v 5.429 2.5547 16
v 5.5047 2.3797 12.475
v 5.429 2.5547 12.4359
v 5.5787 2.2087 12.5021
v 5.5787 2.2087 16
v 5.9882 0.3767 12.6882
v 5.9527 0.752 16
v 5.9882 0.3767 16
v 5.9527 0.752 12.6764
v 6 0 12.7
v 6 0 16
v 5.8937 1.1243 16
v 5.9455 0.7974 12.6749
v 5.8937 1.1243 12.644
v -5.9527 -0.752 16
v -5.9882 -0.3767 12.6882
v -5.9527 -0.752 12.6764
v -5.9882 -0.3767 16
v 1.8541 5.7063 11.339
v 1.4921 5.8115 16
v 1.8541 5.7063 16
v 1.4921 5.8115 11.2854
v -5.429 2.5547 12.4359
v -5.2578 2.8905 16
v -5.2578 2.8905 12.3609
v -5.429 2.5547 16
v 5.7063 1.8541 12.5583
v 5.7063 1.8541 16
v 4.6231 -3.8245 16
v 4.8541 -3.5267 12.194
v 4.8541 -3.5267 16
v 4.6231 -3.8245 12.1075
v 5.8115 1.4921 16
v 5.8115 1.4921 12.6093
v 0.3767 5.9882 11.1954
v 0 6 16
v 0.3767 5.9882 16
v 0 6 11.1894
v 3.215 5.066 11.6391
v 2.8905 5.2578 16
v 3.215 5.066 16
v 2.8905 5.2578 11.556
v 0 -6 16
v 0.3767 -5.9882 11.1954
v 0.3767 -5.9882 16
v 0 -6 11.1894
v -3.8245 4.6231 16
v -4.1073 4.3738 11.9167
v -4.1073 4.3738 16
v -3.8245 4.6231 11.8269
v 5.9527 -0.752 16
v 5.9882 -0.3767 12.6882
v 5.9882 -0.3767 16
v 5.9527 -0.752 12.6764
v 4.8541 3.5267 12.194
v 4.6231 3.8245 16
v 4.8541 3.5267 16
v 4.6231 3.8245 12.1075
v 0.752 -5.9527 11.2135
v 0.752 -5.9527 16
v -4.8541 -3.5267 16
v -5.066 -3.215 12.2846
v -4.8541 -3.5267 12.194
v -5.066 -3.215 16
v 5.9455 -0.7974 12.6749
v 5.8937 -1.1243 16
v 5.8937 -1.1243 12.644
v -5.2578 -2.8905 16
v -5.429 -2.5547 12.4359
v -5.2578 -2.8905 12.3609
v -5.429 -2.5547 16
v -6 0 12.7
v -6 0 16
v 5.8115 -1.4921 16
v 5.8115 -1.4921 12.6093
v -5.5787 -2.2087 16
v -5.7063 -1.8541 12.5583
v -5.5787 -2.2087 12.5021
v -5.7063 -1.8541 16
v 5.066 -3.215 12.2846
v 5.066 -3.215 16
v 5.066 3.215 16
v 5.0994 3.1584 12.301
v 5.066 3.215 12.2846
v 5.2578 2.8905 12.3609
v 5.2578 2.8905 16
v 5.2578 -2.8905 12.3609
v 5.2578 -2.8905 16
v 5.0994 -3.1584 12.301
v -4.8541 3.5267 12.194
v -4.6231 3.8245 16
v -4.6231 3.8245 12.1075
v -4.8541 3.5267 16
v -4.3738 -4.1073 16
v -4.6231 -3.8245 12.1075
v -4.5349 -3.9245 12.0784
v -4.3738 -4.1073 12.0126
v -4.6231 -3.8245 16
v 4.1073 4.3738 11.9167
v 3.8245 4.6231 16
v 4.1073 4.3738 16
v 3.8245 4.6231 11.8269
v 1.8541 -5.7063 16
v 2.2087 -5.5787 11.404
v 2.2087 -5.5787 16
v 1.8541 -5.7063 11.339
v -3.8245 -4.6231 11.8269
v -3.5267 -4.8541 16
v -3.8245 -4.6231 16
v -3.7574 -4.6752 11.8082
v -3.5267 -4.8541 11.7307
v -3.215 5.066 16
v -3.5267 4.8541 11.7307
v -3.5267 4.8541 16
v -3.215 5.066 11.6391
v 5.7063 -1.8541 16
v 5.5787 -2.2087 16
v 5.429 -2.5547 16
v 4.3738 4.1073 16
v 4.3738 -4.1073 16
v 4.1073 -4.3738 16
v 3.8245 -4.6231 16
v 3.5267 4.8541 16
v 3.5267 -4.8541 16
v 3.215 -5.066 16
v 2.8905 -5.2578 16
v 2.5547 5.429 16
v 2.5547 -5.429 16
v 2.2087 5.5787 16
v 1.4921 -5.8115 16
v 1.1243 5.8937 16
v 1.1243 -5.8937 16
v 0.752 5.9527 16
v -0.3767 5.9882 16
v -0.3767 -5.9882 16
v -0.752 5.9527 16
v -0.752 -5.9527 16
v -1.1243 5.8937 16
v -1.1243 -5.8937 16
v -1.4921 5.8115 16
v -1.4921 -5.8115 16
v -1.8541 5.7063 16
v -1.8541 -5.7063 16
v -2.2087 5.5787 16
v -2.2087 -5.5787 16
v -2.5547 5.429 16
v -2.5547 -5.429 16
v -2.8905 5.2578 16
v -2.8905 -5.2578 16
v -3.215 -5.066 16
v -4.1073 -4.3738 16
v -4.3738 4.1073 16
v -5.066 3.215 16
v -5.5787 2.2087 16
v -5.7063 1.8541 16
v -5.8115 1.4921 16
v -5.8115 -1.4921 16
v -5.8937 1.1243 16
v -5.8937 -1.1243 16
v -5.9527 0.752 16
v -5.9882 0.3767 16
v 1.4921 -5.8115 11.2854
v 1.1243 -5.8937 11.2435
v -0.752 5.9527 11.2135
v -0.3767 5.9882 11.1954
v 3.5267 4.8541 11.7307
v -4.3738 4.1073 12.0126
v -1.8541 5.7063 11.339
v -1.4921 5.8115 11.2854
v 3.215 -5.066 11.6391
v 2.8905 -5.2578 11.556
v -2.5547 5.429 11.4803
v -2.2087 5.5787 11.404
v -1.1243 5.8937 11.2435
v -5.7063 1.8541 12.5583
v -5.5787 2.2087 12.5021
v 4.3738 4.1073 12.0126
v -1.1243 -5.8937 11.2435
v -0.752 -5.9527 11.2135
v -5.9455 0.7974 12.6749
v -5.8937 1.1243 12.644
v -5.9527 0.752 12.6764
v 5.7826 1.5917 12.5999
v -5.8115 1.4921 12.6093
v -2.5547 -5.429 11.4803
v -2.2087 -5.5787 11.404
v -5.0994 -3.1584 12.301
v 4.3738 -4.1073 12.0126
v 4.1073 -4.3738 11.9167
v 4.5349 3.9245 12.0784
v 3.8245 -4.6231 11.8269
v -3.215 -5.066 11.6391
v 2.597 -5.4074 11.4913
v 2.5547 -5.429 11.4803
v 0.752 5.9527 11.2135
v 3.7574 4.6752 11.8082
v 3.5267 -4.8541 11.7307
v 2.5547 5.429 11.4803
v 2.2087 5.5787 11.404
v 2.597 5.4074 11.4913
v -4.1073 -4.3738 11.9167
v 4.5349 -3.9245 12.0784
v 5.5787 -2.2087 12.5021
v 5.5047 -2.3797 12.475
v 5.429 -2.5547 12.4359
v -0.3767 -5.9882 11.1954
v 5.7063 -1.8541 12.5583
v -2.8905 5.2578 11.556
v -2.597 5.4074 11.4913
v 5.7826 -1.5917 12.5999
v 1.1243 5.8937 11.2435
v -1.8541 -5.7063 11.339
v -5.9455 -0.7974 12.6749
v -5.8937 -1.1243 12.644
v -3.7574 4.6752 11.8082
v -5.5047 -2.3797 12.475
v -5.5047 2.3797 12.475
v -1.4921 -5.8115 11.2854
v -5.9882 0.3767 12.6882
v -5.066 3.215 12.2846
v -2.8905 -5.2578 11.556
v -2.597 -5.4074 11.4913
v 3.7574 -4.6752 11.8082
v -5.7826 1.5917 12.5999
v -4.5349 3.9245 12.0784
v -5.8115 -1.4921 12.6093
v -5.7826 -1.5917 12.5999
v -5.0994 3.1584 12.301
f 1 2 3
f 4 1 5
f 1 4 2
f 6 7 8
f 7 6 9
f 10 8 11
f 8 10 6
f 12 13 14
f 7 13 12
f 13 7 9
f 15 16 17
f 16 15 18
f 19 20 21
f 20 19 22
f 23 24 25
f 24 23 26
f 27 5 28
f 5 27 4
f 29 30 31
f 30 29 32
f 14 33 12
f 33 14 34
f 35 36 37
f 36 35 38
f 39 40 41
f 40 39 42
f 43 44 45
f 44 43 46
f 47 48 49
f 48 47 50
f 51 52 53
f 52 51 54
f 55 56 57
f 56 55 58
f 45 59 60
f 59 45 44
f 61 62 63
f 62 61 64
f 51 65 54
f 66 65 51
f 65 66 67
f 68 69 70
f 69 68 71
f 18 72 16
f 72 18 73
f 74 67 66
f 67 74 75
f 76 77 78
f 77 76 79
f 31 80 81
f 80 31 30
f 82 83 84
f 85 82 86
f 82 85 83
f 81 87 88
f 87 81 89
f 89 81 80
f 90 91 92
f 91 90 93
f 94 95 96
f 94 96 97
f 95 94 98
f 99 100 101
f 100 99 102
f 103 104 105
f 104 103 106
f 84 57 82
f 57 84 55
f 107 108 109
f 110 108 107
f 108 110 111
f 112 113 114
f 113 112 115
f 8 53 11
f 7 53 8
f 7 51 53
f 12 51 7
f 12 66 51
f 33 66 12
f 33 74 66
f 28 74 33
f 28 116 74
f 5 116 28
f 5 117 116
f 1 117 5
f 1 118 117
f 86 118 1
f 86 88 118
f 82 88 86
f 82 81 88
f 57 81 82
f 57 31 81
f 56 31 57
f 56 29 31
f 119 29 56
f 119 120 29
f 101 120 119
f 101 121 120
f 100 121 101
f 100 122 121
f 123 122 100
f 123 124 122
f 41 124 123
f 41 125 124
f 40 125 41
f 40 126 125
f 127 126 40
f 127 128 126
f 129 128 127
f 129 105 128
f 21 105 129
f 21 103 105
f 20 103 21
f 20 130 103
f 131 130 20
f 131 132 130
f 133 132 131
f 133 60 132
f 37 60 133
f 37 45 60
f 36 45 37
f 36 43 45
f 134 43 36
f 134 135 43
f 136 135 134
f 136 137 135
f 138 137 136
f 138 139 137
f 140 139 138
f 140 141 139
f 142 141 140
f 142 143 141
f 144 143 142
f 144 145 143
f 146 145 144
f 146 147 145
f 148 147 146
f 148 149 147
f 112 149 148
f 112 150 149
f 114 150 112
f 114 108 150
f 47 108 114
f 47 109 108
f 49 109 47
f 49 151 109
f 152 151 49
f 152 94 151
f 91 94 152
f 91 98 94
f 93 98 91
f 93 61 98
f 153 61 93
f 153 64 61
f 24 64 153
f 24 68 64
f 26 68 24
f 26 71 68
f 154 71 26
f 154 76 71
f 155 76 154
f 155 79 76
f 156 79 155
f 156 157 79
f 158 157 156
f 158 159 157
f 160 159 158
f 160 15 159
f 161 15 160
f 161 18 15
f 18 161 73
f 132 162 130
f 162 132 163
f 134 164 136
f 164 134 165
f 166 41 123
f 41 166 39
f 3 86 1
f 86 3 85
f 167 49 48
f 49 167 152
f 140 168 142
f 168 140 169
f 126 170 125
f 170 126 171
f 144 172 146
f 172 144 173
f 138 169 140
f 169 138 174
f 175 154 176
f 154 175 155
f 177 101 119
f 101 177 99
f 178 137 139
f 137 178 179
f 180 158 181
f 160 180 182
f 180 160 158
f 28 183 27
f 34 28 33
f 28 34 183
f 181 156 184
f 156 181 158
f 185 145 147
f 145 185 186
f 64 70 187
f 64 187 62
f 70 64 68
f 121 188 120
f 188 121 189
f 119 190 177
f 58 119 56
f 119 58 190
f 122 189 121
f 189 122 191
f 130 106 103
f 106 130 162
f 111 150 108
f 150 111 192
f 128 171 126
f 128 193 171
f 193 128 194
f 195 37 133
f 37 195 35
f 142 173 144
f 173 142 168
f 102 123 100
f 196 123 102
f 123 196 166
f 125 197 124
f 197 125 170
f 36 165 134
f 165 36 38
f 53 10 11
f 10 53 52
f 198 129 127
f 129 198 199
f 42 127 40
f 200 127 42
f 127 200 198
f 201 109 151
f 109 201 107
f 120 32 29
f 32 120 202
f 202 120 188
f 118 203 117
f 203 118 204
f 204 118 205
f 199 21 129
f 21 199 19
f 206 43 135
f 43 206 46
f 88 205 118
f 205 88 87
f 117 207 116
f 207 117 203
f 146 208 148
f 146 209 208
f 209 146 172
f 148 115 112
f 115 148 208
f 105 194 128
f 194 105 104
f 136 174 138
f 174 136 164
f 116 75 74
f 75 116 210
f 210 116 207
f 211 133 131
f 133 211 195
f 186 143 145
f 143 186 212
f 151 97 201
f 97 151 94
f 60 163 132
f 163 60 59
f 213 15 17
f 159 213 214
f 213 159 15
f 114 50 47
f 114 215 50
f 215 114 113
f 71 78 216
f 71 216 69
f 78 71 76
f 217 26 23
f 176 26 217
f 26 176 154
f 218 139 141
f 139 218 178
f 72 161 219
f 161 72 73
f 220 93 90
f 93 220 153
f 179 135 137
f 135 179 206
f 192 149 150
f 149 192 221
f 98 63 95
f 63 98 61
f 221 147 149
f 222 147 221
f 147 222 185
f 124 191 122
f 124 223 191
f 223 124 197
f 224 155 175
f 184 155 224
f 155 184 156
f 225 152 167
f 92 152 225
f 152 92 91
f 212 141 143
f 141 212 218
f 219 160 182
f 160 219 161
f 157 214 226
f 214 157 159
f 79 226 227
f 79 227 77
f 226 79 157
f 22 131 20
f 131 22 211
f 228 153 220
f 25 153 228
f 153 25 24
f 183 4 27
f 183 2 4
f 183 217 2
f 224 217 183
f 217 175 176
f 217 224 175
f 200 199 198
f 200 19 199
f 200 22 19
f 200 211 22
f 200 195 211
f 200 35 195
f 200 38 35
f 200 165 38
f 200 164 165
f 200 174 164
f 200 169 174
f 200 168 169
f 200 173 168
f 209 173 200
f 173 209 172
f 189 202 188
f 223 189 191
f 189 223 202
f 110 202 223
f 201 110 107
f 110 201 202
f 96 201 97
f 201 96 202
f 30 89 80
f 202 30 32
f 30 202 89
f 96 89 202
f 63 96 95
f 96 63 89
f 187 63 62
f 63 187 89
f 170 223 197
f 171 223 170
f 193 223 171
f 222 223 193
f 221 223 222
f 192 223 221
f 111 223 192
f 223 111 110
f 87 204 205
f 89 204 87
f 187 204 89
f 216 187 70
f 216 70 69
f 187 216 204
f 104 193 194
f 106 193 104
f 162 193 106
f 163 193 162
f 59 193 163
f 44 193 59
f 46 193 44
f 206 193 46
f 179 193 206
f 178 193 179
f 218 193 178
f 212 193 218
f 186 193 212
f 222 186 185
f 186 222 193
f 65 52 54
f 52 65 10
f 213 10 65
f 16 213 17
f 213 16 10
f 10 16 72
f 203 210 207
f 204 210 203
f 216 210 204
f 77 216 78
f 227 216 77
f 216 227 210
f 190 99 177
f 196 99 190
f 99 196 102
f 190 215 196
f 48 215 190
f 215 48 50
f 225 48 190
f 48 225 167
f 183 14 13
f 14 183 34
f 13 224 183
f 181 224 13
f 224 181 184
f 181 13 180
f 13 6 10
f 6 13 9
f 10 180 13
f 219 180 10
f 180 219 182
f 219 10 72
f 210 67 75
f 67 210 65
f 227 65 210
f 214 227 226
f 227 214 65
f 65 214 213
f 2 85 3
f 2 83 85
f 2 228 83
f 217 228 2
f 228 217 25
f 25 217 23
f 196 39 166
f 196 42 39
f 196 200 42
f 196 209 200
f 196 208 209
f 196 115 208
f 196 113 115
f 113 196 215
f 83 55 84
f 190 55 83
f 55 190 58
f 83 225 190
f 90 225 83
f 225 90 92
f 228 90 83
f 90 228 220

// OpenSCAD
// file: roundCornersCube.scad
/*
http://codeviewer.org/view/code:1b36 
Copyright (C) 2011 Sergio Vilches
This program is free software: you can redistribute it and/or modify it under the terms of the GNU General Public License as published by the Free Software Foundation, either version 3 of the License, or (at your option) any later version.
This program is distributed in the hope that it will be useful, but WITHOUT ANY WARRANTY; without even the implied warranty of MERCHANTABILITY or FITNESS FOR A PARTICULAR PURPOSE. See the GNU General Public License for more details. You should have received a copy of the GNU General Public License along with this program. If not, see <http://www.gnu.org/licenses/>.
Contact: s.vilches.e@gmail.com


    ----------------------------------------------------------- 
                 Round Corners Cube (Extruded)                
      roundCornersCube(x,y,z,r) Where:                        
         - x = Xdir width                                     
         - y = Ydir width                                     
         - z = Height of the cube                             
         - r = Rounding radious                               
                                                              
      Example: roundCornerCube(10,10,2,1);                    
     *Some times it's needed to use F6 to see good results!   
 	 ----------------------------------------------------------- 
*/
// Test it!
// roundCornersCube(10,5,2,1);


module createMeniscus(h,radius) // This module creates the shape that needs to be substracted from a cube to make its corners rounded.
difference(){        //This shape is basicly the difference between a quarter of cylinder and a cube
   translate([radius/2+0.1,radius/2+0.1,0]){
      cube([radius+0.2,radius+0.1,h+0.2],center=true);         // All that 0.x numbers are to avoid "ghost boundaries" when substracting
   }

   cylinder(h=h+0.2,r=radius,$fn = 25,center=true);
}


module roundCornersCube(x,y,z,r)  // Now we just substract the shape we have created in the four corners
difference(){
   cube([x,y,z], center=true);

translate([x/2-r,y/2-r]){  // We move to the first corner (x,y)
      rotate(0){  
         createMeniscus(z,r); // And substract the meniscus
      }
   }
   translate([-x/2+r,y/2-r]){ // To the second corner (-x,y)
      rotate(90){
         createMeniscus(z,r); // But this time we have to rotate the meniscus 90 deg
      }
   }
      translate([-x/2+r,-y/2+r]){ // ... 
      rotate(180){
         createMeniscus(z,r);
      }
   }
      translate([x/2-r,-y/2+r]){
      rotate(270){
         createMeniscus(z,r);
      }
   }
}

module rrc(x,y,z,r) {
   translate([x/2,y/2,z/2])
   roundCornersCube(x,y,z,r);
}
// main file
include <roundCornersCube.scad>

difference() {
  cylinder($fn = 100, 16,6,6);
  translate([-50,0,0])
    rotate([0,90,0])
      cylinder($fn = 100, 100,12.7,12.7);
}
